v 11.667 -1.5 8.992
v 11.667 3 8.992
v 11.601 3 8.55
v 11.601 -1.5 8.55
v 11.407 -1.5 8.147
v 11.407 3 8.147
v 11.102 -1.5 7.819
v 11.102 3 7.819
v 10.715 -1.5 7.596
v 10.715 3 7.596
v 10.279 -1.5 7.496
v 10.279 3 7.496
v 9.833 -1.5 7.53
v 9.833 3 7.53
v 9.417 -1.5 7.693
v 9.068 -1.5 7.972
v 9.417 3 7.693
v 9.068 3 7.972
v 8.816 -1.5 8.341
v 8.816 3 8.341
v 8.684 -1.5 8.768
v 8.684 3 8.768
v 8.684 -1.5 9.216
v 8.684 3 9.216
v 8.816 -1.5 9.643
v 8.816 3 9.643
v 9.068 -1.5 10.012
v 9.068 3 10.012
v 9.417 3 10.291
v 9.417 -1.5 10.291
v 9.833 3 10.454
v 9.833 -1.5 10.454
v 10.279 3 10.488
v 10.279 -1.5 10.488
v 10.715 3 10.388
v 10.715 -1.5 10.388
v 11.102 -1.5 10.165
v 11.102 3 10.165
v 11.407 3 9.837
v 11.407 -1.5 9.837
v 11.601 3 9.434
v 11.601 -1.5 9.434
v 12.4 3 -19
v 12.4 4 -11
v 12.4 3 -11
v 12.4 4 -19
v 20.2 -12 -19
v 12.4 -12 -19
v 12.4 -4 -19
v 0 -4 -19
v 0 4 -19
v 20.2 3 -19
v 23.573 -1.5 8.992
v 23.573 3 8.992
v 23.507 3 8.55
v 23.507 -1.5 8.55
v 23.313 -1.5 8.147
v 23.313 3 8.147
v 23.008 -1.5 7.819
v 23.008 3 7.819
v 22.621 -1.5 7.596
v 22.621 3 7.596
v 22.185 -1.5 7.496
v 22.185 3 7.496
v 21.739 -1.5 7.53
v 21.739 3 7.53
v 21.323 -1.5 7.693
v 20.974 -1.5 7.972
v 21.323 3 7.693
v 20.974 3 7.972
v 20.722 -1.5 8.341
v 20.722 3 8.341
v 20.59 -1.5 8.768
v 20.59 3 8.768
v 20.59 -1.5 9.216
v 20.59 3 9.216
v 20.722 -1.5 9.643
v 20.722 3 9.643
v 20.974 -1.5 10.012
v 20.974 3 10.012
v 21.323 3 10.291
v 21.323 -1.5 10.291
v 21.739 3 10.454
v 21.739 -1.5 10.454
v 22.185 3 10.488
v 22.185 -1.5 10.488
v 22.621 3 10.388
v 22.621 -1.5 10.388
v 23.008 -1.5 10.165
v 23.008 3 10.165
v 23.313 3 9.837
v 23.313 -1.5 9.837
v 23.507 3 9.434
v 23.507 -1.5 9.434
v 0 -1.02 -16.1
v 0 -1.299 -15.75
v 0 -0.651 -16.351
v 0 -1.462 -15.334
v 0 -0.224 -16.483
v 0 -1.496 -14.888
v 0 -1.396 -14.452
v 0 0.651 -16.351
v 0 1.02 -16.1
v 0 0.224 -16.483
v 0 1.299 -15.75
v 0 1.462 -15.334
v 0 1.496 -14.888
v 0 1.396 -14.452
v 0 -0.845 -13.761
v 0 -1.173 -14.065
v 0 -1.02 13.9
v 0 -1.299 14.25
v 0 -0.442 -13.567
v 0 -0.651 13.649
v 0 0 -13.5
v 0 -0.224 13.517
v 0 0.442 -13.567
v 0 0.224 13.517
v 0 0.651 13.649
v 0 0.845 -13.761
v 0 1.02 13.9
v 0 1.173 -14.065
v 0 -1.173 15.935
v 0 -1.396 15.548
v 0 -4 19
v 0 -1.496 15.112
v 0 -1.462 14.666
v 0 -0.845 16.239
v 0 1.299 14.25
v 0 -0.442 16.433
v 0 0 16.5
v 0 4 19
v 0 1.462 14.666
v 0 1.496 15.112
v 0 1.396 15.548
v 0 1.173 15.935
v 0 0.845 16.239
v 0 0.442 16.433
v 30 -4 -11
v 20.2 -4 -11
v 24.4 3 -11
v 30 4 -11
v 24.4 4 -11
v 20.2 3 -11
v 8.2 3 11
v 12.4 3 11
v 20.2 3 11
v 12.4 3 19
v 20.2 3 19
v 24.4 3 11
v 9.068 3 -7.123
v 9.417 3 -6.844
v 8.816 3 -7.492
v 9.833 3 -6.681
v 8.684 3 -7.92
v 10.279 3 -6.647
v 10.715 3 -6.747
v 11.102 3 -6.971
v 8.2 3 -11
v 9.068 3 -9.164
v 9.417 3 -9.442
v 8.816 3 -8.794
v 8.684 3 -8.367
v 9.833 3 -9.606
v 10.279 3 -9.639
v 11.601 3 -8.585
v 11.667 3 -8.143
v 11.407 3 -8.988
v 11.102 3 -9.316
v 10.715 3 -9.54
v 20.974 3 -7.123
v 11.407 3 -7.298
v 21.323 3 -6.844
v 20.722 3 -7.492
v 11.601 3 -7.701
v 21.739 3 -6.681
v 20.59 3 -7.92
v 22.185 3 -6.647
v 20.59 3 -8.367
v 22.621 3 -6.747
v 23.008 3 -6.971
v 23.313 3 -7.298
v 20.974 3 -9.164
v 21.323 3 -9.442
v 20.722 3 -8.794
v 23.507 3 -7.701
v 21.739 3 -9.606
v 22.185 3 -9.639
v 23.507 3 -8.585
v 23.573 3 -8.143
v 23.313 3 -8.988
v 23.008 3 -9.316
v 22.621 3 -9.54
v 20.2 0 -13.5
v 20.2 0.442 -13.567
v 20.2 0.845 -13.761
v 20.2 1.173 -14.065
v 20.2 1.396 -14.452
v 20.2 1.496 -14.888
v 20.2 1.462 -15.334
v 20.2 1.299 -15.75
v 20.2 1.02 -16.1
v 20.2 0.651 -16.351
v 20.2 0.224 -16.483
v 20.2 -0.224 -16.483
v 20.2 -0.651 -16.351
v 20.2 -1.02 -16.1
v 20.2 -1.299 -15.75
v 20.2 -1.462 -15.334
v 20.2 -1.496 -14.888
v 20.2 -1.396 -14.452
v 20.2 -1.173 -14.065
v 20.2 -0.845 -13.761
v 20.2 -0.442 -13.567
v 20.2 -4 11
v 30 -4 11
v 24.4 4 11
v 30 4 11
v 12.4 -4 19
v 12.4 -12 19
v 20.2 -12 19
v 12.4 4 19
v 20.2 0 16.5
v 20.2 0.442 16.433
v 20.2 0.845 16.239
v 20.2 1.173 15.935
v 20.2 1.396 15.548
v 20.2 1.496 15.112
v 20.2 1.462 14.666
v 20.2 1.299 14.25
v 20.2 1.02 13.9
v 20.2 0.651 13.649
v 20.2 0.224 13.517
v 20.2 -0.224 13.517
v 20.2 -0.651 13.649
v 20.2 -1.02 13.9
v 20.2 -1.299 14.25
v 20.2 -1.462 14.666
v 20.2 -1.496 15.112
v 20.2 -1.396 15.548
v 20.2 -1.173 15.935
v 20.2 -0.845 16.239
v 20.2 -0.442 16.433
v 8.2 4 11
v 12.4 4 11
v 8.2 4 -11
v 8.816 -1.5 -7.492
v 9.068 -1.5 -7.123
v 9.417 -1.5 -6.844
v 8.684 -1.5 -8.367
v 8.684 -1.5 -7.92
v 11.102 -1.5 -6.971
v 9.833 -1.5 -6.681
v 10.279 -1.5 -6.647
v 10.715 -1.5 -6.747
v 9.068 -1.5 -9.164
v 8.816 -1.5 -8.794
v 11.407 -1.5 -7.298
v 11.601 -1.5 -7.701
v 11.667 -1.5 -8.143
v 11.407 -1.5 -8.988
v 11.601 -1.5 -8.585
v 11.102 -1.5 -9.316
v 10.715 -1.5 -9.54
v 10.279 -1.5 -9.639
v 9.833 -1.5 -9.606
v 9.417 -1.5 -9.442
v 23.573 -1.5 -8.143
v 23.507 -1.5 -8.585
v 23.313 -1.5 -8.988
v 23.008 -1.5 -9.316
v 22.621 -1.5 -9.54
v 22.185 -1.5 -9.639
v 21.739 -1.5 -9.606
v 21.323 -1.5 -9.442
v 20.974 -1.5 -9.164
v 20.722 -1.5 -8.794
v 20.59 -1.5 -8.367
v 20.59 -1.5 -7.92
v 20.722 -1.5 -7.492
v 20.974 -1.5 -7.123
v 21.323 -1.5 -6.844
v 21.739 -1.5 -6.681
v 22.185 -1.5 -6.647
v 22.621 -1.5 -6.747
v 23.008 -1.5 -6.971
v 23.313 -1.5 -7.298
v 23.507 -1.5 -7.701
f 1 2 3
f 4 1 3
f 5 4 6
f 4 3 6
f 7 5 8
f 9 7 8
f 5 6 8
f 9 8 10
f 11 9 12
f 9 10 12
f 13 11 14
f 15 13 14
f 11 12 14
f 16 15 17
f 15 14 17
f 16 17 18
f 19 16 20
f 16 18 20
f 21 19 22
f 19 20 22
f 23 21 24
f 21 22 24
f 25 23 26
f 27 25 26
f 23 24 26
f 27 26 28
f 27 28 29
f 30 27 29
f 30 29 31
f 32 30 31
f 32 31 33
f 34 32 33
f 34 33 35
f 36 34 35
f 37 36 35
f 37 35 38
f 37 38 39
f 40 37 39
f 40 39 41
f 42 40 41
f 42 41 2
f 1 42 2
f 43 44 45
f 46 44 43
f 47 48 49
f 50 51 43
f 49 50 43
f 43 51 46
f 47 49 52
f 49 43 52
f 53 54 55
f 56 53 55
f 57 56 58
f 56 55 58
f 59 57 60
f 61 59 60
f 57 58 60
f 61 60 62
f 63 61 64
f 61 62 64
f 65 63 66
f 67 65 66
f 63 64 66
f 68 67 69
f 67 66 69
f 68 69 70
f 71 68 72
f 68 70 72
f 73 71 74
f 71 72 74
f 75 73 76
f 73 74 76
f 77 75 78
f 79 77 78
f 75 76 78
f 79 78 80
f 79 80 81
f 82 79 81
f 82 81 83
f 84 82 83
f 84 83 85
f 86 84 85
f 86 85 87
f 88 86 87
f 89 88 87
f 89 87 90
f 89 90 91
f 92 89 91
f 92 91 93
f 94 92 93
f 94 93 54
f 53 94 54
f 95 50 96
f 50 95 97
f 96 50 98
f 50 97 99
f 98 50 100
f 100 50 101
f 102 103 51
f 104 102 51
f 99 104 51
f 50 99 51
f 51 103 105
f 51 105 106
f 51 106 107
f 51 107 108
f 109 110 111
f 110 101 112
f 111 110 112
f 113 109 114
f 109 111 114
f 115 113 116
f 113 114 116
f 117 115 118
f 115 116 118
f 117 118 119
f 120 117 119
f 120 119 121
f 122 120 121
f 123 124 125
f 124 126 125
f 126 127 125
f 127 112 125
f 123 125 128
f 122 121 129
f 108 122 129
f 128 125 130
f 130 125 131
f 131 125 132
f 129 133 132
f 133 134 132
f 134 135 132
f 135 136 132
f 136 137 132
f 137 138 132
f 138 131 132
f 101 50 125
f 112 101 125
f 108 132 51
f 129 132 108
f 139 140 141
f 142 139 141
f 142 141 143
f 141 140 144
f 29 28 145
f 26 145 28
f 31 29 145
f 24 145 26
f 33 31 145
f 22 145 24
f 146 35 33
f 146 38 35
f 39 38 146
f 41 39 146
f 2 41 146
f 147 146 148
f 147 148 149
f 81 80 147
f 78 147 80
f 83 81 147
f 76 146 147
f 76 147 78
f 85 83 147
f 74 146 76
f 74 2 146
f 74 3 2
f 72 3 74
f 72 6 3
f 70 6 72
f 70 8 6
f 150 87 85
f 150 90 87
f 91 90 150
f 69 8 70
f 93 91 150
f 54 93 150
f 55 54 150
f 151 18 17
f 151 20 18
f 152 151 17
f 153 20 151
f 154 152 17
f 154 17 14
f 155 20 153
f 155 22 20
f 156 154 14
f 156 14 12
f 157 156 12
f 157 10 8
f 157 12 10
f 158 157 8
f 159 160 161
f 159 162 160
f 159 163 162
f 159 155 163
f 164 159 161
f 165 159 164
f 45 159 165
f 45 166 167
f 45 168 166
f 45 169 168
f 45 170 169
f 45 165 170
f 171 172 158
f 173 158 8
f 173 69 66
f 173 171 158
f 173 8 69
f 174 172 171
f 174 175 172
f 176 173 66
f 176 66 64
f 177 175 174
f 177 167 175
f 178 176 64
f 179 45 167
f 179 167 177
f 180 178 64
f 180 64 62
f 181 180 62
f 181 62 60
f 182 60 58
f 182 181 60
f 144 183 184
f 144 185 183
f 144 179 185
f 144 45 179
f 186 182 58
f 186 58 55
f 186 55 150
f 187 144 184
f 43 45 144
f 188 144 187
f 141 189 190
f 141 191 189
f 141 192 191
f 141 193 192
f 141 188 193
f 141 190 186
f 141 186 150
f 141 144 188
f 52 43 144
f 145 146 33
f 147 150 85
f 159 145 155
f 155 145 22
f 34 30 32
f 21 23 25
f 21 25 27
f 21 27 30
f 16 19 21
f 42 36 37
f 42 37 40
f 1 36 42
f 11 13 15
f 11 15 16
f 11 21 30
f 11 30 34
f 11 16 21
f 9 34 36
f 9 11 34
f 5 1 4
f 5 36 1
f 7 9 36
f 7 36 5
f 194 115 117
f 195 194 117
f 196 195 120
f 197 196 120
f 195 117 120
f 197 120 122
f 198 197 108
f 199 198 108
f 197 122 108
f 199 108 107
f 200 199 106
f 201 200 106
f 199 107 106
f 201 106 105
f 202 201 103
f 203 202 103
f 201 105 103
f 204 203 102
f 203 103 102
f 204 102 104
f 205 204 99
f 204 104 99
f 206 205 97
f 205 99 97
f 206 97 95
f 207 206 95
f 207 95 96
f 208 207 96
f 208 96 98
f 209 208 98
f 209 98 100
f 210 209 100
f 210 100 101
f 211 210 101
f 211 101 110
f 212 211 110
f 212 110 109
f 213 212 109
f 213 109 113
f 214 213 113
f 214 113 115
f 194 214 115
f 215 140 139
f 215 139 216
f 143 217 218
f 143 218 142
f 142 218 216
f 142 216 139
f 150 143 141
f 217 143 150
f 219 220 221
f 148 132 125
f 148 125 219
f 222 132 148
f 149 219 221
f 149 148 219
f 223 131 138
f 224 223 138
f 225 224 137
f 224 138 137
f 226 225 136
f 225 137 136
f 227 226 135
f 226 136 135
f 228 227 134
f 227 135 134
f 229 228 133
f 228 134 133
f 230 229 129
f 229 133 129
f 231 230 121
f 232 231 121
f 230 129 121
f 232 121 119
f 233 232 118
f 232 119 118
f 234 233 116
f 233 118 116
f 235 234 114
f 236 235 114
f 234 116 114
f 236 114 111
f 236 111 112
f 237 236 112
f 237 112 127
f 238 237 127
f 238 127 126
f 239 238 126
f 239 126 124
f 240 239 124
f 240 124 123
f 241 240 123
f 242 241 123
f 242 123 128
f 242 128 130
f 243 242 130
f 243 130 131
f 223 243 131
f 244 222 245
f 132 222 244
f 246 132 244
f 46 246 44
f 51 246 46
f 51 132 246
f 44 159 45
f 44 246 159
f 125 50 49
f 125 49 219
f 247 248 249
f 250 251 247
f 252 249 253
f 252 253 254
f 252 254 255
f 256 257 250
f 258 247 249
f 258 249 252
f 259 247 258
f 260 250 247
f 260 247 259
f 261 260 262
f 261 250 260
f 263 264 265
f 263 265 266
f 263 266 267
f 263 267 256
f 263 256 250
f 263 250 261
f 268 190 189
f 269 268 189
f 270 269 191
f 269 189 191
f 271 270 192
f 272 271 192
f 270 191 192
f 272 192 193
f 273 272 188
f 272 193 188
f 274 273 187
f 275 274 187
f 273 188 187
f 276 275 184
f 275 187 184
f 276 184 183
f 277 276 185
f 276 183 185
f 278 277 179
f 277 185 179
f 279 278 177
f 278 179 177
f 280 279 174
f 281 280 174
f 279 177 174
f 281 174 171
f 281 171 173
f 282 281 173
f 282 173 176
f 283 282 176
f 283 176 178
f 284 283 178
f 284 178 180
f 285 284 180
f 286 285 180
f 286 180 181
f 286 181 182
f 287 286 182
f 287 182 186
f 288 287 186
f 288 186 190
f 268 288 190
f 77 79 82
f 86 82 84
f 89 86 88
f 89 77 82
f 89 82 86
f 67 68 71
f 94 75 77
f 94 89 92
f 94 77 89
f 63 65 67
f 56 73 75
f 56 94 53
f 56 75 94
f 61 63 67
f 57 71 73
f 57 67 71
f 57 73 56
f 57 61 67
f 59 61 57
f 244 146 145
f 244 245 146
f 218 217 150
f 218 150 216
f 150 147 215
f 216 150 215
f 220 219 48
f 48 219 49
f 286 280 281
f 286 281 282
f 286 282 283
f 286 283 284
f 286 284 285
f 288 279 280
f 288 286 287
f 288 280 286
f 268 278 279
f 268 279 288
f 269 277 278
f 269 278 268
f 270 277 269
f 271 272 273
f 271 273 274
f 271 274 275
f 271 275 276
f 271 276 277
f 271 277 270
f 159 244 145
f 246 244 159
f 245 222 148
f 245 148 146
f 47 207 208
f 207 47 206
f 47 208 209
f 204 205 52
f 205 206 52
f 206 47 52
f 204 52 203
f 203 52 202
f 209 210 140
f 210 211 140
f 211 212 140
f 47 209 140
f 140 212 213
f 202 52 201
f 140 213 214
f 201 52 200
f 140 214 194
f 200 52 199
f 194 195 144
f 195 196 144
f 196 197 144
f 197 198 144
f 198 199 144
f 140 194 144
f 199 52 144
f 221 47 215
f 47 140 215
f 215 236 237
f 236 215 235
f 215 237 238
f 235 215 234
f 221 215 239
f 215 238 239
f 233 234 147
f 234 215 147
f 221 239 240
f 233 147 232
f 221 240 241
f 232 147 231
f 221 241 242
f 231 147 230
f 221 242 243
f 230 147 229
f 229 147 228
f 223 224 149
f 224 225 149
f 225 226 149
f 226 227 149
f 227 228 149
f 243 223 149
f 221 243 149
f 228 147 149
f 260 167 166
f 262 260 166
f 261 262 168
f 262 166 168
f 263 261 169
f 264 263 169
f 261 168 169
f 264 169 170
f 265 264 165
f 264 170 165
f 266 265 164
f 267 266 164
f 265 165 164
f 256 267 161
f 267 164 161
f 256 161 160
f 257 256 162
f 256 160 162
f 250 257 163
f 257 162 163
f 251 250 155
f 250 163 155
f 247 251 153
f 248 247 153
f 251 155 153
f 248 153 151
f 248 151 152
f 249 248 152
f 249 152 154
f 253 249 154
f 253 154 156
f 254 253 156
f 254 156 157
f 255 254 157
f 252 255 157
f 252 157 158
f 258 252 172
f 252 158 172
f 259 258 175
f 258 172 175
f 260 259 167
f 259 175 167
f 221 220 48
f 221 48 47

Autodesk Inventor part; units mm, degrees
ref_plane "YZ Plane" through (0, 0, 0) normal (1, 0, 0) x (0, 1, 0)
ref_plane "XZ Plane" through (0, 0, 0) normal (0, 1, 0) x (-1, 0, 0)
ref_plane "XY Plane" through (0, 0, 0) normal (0, 0, 1) x (1, 0, 0)
sketch "Эскиз1" plane through (0, 0, 0) normal (1, 0, 0) x (0, 1, 0)
  line L0 (-4, 19) -> (4, 19)
  line L1 (4, 19) -> (4, -19)
  line L2 (4, -19) -> (-4, -19)
  line L3 (-4, -19) -> (-4, 19)
  line L4 (-4, 19) -> (4, -19) construction
  line L5 (4, 19) -> (-4, -19) construction
  point P0 (0, 0)
  dimension "d0" = 8
  dimension "d1" = 38
extrude "Выдавливание1" add sketch "Эскиз1" along normal blind 20.2
sketch "Эскиз2" plane through (0, 0, 0) normal (-1, 0, 0) x (0, 0, 1)
  line L0 (0, 0) -> (-15, 0)
  line L1 (0, 0) -> (15, 0) construction
  line L2 (-15, 0) -> (15, 0)
  circle A0 centre (-15, 0) radius 1.5
  circle A1 centre (15, 0) radius 1.5
  dimension "d4" = 15
  dimension "d5" = 180
  dimension "d6" = 30
  dimension "d7" = 3
  dimension "d8" = 3
extrude "Выдавливание2" cut sketch "Эскиз2" against normal through all
sketch "Эскиз3" plane through (0, -4, -19) normal (0, -1, 0) x (1, 0, 0)
  line L0 (0, 38) -> (20.2, 38) projected
  line L1 (0, 0) -> (20.2, 0) projected
  line L2 (20.2, 38) -> (12.4, 38)
  line L3 (12.4, 38) -> (12.4, 0)
  line L4 (12.4, 0) -> (20.2, 0)
  line L5 (20.2, 0) -> (20.2, 38)
  point P0 (0, 19)
  dimension "d11" = 7.8
extrude "Выдавливание3" add sketch "Эскиз3" along normal blind 8
sketch "Эскиз4" plane through (20.2, 0, 0) normal (1, 0, 0) x (0, 0, -1)
  line L0 (19, -4) -> (-19, -4) projected
  line L1 (-18.1844, -4) -> (0, -4)
  line L2 (19, 4) -> (-19, 4) projected
  line L3 (-11, -4) -> (11, -4)
  line L4 (11, -4) -> (11, 4)
  line L5 (11, 4) -> (-11, 4)
  line L6 (-11, 4) -> (-11, -4)
  line L7 (-11, -4) -> (11, 4) construction
  line L8 (11, -4) -> (-11, 4) construction
  point P0 (0, 0)
  dimension "d17" = 22
extrude "Выдавливание4" add sketch "Эскиз4" along normal blind 9.8
sketch "Эскиз5" plane through (0, 4, 19) normal (0, 1, 0) x (1, 0, 0)
  line L0 (0, 38) -> (12.4, 38) projected
  line L1 (12.4, 38) -> (24.4, 38)
  line L2 (24.4, 38) -> (24.4, 0)
  line L3 (24.4, 0) -> (12.4, 0)
  line L4 (12.4, 0) -> (12.4, 38)
  line L5 (20.2, 8) -> (30, 8) projected
  line L6 (20.2, 38) -> (20.2, 0) projected
  line L7 (24.4, 8) -> (20.2, 8)
  line L8 (20.2, 8) -> (20.2, 30)
  line L9 (20.2, 30) -> (24.4, 30)
  line L10 (24.4, 30) -> (24.4, 8)
  line L11 (12.4, 0) -> (12.4, 38) projected
  line L12 (12.4, 8) -> (8.2, 8)
  line L13 (8.2, 8) -> (8.2, 30)
  line L14 (8.2, 30) -> (12.4, 30)
  line L15 (12.4, 30) -> (12.4, 8)
  point P0 (0, 19)
  dimension "d20" = 12
  dimension "d21" = 38
  dimension "d24" = 22
  dimension "d25" = 4.2
  dimension "d26" = 4.2
extrude "Выдавливание5" cut sketch "Эскиз5" against normal blind 1
sketch "Эскиз6" plane through (0, 3, 19) normal (0, 1, 0) x (1, 0, 0)
  circle A0 centre (10.1672, 27.1433) radius 1.5
  circle A1 centre (10.1672, 10.008) radius 1.5
  circle A2 centre (22.0732, 27.1433) radius 1.5
  circle A3 centre (22.0732, 10.008) radius 1.5
  point P0 (0, 19)
  dimension "d27" = 3
  dimension "d28" = 3
  dimension "d29" = 3
  dimension "d30" = 3
extrude "Выдавливание6" cut sketch "Эскиз6" against normal blind 4.5
sketch "Эскиз7" plane through (0, 3, 19) normal (0, 1, 0) x (1, 0, 0)
  circle A0 centre (22.0732, 27.1433) radius 1.5 projected
  circle A1 centre (10.1672, 27.1433) radius 1.5 projected
  circle A2 centre (10.1672, 10.008) radius 1.5 projected
  circle A3 centre (22.0732, 10.008) radius 1.5 projected
  line L0 (20.2, 8) -> (20.2, 0) projected
  line L1 (24.4, 8) -> (20.2, 8) projected
  line L2 (24.4, 30) -> (24.4, 8) projected
  line L3 (20.2, 30) -> (24.4, 30) projected
  line L4 (20.2, 38) -> (20.2, 30) projected
  line L5 (12.4, 38) -> (20.2, 38) projected
  line L6 (12.4, 30) -> (12.4, 38) projected
  line L7 (8.2, 30) -> (12.4, 30) projected
  line L8 (8.2, 8) -> (8.2, 30) projected
  line L9 (12.4, 8) -> (8.2, 8) projected
  line L10 (12.4, 0) -> (12.4, 8) projected
  line L11 (20.2, 0) -> (12.4, 0) projected
  point P0 (0, 19)
properties part number "КВ33.044.502 - Фиксатор оси Y" material "Пластик АБС"
